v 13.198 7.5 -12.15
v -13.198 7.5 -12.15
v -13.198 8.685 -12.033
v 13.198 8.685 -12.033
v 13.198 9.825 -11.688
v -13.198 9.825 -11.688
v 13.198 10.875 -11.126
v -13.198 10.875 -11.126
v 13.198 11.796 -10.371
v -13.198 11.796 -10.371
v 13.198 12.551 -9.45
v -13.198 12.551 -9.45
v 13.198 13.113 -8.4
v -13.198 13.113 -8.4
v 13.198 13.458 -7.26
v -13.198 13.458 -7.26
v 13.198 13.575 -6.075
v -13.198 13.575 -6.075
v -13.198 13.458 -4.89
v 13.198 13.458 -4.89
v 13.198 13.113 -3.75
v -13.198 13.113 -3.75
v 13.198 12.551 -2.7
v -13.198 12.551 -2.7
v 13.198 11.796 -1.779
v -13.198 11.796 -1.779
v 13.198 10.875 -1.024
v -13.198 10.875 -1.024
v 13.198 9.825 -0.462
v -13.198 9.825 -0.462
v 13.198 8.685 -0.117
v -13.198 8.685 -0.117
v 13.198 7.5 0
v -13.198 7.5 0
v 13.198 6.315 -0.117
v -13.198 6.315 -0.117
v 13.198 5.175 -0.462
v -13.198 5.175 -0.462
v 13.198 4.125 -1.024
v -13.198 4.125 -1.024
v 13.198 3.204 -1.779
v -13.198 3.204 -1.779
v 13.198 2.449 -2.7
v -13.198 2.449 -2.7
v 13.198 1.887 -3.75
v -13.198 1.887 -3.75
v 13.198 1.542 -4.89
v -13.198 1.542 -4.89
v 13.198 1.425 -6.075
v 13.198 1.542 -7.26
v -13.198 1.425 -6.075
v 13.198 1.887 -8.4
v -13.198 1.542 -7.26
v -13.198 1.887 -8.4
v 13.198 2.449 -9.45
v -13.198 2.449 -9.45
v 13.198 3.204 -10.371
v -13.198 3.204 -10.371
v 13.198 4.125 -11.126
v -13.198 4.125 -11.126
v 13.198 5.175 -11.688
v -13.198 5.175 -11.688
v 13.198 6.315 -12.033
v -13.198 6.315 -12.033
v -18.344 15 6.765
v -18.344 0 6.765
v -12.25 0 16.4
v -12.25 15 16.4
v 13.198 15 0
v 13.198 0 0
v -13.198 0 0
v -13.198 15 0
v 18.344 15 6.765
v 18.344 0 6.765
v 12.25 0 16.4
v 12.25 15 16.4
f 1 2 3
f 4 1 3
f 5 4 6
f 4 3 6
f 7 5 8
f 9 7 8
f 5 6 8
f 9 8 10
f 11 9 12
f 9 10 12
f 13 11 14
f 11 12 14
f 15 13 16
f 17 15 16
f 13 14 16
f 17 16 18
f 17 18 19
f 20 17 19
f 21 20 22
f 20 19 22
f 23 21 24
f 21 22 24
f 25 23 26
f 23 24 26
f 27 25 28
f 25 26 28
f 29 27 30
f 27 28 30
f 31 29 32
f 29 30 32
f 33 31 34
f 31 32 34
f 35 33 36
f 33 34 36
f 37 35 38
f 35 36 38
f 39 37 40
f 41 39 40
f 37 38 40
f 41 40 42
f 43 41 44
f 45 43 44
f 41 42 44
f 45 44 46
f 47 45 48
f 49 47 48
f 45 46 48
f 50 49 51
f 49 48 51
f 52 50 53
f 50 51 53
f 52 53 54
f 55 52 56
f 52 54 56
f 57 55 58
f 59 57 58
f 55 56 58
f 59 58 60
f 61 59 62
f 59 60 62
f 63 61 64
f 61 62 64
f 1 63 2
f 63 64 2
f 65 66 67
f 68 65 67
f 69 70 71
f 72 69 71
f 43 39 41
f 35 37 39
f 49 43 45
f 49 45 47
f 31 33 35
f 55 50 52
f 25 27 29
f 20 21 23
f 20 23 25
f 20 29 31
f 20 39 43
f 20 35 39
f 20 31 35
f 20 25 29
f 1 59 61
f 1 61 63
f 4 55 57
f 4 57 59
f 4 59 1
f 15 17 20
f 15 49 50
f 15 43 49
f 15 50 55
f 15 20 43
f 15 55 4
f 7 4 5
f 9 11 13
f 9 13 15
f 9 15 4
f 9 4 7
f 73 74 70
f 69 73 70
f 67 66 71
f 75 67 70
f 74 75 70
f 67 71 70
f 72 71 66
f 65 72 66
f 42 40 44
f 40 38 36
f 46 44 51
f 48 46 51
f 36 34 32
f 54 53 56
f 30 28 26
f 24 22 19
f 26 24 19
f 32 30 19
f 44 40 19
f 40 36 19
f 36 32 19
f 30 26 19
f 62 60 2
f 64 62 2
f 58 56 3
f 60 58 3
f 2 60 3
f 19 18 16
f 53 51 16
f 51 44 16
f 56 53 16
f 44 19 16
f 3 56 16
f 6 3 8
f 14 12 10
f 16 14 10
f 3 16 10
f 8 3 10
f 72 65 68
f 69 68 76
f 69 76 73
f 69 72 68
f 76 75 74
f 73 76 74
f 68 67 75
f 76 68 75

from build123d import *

# Parameters (mm, degrees)
BOSS_EXTRUDE1_DEPTH      = 15
BOSS_EXTRUDE2_DEPTH      = 13.19777
BOSS_EXTRUDE2_DEPTH_BACK = 13.19777
SKETCH2_R                = 6.075


with BuildPart() as part:
    # Sketch1 → Boss-Extrude1 (new body)
    with BuildSketch(Plane(origin=(0, 0, 0), x_dir=(1, 0, 0), z_dir=(0, 1, 0))):
        Polygon((-13.197769506, 0), (-18.343682878, -6.765321542), (-12.25, -16.4), (12.25, -16.4), (18.343682878, -6.765321542), (13.197769506, 0), align=None)
    extrude(amount=BOSS_EXTRUDE1_DEPTH)


with BuildPart() as body_2:
    # Sketch2 → Boss-Extrude2 (new, two sides: drawn at the far end of the back side and taken through both)
    with BuildSketch(Plane(origin=(0, 0, 0), x_dir=(0, 0, -1), z_dir=(1, 0, 0)).offset(-BOSS_EXTRUDE2_DEPTH_BACK)):
        with Locations((6.075, 7.5)):
            Circle(SKETCH2_R)
    extrude(amount=BOSS_EXTRUDE2_DEPTH + BOSS_EXTRUDE2_DEPTH_BACK)


solid = Compound([part.part, body_2.part])
